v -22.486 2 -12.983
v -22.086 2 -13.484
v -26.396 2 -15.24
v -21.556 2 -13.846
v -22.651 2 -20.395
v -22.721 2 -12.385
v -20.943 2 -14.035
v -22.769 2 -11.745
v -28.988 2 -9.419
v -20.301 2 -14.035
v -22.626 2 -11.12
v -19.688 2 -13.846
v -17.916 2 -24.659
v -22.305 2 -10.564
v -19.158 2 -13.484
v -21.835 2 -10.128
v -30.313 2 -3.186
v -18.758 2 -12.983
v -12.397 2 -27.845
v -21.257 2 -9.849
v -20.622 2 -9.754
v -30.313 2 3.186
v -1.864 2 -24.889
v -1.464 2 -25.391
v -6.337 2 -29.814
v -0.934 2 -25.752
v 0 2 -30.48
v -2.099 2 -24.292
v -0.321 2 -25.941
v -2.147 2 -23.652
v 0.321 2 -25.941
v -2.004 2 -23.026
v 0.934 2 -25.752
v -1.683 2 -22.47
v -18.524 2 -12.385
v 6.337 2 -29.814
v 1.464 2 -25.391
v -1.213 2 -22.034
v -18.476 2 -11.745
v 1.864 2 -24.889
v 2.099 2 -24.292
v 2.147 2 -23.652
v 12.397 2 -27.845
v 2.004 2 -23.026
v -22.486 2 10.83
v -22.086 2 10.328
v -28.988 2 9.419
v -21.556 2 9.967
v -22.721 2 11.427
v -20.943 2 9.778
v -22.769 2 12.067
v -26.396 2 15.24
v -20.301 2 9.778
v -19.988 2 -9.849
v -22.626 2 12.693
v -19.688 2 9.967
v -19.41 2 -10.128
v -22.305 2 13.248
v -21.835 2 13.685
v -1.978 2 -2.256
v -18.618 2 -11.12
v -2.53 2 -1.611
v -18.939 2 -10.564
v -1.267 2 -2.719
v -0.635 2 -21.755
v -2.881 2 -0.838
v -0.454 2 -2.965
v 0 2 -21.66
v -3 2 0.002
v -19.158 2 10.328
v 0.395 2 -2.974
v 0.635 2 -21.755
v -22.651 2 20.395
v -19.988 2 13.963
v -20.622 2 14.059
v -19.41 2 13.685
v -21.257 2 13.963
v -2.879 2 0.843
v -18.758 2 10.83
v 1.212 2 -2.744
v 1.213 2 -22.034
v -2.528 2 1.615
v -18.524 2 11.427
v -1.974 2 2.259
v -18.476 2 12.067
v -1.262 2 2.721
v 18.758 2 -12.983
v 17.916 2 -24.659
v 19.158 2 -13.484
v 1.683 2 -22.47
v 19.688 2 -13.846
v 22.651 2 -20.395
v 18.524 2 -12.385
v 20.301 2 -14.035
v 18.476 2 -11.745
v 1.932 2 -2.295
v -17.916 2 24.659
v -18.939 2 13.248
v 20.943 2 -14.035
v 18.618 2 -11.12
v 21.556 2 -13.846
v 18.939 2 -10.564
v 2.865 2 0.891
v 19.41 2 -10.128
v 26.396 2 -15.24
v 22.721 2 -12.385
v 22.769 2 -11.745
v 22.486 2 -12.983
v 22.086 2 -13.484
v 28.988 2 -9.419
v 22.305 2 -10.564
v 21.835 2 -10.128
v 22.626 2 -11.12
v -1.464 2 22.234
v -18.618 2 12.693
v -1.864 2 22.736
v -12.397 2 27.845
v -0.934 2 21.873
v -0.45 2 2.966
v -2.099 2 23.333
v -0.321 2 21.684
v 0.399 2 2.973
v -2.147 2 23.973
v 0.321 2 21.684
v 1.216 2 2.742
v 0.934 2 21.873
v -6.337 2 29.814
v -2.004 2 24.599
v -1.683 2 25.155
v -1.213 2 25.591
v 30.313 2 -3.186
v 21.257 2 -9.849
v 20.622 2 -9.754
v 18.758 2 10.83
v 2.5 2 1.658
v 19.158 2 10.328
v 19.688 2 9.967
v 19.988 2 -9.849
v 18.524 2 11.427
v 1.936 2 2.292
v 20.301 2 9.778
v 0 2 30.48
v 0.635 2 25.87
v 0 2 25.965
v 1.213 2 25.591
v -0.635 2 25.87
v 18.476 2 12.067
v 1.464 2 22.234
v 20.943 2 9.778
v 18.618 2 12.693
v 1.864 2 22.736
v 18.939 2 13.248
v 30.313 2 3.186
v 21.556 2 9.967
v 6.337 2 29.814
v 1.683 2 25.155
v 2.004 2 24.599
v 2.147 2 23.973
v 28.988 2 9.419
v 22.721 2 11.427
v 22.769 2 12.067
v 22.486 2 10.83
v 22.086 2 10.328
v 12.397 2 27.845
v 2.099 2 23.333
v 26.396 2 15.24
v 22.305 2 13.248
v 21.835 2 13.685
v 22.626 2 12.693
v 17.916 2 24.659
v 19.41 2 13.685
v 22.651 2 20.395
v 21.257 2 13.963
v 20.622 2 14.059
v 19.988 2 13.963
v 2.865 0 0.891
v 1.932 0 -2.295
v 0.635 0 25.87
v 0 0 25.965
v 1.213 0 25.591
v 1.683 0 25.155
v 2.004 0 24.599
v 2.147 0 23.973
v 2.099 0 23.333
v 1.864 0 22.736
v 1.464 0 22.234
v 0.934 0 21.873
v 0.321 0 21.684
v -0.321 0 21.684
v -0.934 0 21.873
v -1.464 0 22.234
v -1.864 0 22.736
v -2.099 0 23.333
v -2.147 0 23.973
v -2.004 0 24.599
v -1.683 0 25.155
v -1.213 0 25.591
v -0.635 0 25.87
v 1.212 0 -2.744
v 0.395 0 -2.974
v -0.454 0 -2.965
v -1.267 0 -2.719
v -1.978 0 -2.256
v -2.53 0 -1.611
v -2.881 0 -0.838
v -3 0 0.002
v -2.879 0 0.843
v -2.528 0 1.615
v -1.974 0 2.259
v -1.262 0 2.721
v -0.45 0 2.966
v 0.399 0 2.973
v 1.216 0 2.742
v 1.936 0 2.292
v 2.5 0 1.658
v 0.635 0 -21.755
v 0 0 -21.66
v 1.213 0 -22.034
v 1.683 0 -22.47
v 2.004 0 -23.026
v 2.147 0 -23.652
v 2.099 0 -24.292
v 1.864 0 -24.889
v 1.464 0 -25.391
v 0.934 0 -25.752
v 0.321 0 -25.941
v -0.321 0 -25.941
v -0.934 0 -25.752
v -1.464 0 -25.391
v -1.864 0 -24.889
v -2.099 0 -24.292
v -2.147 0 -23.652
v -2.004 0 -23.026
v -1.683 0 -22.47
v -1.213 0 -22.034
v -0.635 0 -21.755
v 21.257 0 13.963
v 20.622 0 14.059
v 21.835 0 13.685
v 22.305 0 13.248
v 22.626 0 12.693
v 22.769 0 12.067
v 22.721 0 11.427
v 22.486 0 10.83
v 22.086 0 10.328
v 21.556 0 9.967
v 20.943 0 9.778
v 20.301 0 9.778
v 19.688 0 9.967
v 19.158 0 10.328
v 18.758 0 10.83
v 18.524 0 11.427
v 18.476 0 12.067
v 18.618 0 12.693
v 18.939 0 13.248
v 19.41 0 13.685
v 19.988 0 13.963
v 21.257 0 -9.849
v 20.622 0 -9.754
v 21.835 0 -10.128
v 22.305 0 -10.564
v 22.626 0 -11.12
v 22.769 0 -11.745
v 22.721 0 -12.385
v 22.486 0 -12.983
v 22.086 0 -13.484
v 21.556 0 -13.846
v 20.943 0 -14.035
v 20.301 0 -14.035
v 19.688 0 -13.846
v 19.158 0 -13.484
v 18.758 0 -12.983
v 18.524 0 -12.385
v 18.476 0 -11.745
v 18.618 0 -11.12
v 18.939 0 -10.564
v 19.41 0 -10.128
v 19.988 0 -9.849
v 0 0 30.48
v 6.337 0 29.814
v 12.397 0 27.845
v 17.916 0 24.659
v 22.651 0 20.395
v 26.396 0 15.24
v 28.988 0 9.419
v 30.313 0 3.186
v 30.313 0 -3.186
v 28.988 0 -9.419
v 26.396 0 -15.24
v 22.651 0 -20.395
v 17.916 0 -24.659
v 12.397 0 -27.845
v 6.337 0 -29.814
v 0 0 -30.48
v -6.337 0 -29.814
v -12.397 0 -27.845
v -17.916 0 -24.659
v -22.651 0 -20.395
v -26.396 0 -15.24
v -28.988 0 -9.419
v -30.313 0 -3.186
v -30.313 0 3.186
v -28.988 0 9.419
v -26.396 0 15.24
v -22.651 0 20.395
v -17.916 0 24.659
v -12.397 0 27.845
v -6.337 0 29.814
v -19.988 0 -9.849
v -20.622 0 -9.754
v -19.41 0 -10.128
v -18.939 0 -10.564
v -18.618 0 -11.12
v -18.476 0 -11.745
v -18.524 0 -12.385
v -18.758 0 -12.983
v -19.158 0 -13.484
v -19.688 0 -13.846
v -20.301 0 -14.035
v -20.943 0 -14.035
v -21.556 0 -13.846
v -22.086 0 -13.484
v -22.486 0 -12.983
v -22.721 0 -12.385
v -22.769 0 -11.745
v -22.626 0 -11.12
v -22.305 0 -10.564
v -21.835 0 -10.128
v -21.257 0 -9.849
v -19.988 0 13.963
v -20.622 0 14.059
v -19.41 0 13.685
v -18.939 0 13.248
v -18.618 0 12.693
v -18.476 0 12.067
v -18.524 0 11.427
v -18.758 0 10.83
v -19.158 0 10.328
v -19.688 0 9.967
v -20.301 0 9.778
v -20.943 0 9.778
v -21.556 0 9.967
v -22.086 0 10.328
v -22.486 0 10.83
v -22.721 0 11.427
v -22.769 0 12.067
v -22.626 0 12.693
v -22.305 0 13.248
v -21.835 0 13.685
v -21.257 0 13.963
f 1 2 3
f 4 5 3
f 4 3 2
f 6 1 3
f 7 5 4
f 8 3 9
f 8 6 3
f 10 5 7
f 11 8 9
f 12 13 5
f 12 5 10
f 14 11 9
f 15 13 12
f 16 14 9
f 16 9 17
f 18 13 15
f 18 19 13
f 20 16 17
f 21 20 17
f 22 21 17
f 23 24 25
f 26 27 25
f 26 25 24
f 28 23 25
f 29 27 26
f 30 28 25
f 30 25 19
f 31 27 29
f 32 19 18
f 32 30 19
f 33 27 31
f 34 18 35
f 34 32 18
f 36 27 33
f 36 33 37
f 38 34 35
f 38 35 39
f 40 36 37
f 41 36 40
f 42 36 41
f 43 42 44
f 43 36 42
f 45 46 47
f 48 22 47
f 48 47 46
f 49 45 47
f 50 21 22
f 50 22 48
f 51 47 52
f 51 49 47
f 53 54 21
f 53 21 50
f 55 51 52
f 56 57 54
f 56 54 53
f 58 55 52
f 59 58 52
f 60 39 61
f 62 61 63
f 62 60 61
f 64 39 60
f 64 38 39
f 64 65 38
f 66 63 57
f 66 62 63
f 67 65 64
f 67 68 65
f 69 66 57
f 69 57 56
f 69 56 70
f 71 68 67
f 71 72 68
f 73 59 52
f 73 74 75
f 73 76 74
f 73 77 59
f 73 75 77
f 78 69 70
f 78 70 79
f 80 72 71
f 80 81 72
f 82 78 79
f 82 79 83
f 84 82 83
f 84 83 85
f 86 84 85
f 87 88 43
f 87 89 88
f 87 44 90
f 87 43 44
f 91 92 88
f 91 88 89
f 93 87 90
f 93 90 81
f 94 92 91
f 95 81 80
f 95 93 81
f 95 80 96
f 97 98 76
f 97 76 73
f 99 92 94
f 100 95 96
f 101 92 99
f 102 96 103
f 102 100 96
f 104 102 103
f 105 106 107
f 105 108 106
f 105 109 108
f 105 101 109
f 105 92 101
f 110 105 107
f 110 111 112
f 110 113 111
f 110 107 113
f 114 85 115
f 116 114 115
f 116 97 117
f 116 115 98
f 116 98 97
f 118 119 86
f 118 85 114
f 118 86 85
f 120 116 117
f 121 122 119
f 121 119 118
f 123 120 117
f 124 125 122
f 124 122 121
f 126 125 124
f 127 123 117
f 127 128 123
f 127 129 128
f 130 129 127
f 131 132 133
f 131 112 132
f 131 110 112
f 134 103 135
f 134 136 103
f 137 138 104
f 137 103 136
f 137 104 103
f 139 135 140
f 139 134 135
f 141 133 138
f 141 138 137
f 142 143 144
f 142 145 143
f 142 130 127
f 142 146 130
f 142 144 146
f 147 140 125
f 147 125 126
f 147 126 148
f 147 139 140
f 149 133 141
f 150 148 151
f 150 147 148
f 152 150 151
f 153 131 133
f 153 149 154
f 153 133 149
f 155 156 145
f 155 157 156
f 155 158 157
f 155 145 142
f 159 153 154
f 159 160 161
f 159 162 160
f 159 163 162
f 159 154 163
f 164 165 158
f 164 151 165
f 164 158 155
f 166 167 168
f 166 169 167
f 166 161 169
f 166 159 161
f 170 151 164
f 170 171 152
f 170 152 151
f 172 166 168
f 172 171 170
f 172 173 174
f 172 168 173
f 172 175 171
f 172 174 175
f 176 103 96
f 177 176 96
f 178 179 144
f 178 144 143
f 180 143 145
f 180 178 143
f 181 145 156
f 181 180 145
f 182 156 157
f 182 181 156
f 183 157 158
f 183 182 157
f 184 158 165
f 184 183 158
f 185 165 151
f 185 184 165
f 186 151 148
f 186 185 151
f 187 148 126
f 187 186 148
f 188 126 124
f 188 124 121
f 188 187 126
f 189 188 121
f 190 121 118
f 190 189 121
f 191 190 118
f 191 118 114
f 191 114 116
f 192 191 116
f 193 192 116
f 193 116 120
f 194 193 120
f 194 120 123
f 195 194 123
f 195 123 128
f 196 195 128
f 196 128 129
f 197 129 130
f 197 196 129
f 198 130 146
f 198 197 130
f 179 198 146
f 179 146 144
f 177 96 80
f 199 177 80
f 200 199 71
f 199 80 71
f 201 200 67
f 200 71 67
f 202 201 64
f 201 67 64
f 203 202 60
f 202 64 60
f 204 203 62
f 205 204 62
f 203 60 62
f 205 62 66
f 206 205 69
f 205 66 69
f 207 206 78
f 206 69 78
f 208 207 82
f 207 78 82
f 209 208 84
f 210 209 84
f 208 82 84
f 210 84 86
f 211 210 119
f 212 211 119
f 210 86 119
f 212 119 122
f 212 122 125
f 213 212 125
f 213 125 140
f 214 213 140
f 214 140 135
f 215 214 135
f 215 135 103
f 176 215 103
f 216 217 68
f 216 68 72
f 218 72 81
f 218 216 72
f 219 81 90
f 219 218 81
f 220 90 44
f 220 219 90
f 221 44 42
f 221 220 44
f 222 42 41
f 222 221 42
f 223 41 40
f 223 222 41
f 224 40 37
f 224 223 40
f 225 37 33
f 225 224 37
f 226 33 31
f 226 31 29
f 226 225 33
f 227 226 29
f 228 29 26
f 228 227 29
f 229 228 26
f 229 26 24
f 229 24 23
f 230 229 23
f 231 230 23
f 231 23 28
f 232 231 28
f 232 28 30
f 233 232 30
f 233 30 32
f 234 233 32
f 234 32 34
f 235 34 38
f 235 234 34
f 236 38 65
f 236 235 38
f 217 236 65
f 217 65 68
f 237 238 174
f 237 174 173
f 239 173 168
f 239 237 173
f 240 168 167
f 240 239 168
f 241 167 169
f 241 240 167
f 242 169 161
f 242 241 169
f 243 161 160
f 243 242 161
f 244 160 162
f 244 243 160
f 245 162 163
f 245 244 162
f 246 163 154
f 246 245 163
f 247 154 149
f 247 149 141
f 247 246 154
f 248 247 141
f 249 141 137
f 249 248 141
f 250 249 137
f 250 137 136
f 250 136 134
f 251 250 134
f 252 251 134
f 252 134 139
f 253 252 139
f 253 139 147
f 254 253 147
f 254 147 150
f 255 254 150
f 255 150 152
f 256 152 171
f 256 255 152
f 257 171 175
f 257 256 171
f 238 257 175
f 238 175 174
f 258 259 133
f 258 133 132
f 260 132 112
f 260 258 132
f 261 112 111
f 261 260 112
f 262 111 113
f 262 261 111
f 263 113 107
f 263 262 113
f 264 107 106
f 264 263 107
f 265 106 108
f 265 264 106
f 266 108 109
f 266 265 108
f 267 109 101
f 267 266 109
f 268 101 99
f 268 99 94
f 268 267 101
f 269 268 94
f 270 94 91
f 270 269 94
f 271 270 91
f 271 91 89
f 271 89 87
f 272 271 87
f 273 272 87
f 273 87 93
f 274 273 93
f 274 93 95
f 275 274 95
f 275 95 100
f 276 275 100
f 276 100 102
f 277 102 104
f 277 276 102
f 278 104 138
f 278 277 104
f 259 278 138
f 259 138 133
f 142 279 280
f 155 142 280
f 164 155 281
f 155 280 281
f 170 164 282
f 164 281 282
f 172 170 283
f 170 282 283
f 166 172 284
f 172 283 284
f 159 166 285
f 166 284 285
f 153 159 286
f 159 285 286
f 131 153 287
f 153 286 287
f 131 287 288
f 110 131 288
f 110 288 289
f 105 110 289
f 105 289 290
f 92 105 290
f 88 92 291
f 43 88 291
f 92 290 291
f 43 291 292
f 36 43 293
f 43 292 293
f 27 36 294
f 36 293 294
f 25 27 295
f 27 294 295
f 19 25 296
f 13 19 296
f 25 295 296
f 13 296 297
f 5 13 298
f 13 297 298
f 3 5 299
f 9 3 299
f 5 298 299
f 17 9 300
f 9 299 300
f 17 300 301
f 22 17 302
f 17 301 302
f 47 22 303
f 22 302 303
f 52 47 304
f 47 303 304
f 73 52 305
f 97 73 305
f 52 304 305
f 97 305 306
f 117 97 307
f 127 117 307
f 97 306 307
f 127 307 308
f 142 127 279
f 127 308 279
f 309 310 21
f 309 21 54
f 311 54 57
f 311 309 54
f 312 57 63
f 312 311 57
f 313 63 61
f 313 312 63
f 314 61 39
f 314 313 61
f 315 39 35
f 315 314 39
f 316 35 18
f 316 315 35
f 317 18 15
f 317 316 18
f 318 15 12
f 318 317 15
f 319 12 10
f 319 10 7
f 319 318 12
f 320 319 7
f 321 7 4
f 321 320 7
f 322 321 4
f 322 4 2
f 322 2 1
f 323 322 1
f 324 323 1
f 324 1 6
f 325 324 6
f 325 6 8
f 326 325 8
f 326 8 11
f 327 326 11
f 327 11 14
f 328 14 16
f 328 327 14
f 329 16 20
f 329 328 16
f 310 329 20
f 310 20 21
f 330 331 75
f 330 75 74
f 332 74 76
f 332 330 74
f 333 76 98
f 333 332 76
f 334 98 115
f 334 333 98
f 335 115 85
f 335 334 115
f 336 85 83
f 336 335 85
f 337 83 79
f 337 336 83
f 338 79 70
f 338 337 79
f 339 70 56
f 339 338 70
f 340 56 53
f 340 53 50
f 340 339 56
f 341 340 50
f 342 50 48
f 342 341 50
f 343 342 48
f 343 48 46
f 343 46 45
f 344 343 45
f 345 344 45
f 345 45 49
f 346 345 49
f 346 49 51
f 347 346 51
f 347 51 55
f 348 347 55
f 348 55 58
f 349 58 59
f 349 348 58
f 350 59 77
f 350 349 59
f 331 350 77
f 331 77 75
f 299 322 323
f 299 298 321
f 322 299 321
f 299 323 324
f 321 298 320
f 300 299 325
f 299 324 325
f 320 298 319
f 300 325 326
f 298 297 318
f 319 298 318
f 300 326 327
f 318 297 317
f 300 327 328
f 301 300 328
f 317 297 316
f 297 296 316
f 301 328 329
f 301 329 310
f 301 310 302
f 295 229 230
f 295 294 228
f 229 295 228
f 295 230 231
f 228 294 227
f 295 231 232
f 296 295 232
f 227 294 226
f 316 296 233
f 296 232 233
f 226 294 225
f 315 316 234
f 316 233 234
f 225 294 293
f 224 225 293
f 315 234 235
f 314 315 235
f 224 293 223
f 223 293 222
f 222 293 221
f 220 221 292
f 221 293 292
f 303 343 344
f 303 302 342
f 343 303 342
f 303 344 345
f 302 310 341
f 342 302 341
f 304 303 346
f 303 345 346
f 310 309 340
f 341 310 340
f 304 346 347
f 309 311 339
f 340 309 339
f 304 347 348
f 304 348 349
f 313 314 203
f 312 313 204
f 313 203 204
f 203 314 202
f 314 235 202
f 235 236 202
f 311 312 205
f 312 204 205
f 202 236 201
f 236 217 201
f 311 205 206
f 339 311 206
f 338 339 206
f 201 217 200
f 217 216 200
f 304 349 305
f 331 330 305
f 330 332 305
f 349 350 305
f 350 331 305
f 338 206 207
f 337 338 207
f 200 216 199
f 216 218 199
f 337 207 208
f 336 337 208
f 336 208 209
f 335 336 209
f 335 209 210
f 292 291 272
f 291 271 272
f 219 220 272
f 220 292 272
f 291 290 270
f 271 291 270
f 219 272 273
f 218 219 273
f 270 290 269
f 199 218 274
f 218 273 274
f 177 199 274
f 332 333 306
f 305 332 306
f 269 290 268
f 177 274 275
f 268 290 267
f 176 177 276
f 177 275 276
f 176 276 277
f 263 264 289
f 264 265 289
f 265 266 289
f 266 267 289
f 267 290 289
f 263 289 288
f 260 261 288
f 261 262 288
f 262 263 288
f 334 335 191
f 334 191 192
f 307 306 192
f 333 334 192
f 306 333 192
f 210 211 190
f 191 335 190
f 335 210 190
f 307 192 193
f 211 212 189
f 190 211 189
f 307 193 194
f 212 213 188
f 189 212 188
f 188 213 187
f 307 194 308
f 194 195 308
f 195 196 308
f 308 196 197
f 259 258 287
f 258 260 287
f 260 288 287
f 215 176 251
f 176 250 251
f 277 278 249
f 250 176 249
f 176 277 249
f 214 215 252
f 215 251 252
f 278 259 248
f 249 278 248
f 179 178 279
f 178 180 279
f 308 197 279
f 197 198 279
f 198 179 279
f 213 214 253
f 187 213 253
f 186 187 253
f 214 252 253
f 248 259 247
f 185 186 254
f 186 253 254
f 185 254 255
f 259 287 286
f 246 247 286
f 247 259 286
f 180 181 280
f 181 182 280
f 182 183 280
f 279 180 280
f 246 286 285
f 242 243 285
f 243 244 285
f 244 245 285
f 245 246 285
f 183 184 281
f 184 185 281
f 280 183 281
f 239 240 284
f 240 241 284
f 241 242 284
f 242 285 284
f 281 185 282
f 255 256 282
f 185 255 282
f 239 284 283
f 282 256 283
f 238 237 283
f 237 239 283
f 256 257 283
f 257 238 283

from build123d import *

# Parameters (mm, degrees)
SKETCH1_R           = 30.48
SKETCH1_R_2         = 2.15265
BOSS_EXTRUDE1_DEPTH = 2
CUT_EXTRUDE1_DEPTH  = 10


with BuildPart() as part:
    # Sketch1 → Boss-Extrude1 (new body)
    with BuildSketch(Plane(origin=(0, 0, 0), x_dir=(1, 0, 0), z_dir=(0, 1, 0))):
        with Locations(Location((0, 0, 0), (0, 0, 270))):
            Circle(SKETCH1_R)
        with Locations(Location((0, -23.8125, 0), (0, 0, 270))):
            Circle(SKETCH1_R_2, mode=Mode.SUBTRACT)
        with Locations(Location((20.622229928, -11.90625, 0), (0, 0, 270))):
            Circle(SKETCH1_R_2, mode=Mode.SUBTRACT)
        with Locations(Location((20.622229928, 11.90625, 0), (0, 0, 270))):
            Circle(SKETCH1_R_2, mode=Mode.SUBTRACT)
        with Locations(Location((0, 23.8125, 0), (0, 0, 270))):
            Circle(SKETCH1_R_2, mode=Mode.SUBTRACT)
        with Locations(Location((-20.622229928, 11.90625, 0), (0, 0, 270))):
            Circle(SKETCH1_R_2, mode=Mode.SUBTRACT)
        with Locations(Location((-20.622229928, -11.90625, 0), (0, 0, 270))):
            Circle(SKETCH1_R_2, mode=Mode.SUBTRACT)
    extrude(amount=BOSS_EXTRUDE1_DEPTH)

    # Sketch2 → Cut-Extrude1 (cut)
    with BuildSketch(Plane(origin=(0, 2, 0), x_dir=(1, 0, 0), z_dir=(0, 1, 0))):
        with BuildLine():
            ThreePointArc((1.93204455, 2.295038966), (-2.879237228, -0.842610814), (2.864533851, -0.8913169))
            Line((2.864533851, -0.8913169), (1.93204455, 2.295038966))
        make_face()
    extrude(amount=-CUT_EXTRUDE1_DEPTH, mode=Mode.SUBTRACT)


solid = part.part
